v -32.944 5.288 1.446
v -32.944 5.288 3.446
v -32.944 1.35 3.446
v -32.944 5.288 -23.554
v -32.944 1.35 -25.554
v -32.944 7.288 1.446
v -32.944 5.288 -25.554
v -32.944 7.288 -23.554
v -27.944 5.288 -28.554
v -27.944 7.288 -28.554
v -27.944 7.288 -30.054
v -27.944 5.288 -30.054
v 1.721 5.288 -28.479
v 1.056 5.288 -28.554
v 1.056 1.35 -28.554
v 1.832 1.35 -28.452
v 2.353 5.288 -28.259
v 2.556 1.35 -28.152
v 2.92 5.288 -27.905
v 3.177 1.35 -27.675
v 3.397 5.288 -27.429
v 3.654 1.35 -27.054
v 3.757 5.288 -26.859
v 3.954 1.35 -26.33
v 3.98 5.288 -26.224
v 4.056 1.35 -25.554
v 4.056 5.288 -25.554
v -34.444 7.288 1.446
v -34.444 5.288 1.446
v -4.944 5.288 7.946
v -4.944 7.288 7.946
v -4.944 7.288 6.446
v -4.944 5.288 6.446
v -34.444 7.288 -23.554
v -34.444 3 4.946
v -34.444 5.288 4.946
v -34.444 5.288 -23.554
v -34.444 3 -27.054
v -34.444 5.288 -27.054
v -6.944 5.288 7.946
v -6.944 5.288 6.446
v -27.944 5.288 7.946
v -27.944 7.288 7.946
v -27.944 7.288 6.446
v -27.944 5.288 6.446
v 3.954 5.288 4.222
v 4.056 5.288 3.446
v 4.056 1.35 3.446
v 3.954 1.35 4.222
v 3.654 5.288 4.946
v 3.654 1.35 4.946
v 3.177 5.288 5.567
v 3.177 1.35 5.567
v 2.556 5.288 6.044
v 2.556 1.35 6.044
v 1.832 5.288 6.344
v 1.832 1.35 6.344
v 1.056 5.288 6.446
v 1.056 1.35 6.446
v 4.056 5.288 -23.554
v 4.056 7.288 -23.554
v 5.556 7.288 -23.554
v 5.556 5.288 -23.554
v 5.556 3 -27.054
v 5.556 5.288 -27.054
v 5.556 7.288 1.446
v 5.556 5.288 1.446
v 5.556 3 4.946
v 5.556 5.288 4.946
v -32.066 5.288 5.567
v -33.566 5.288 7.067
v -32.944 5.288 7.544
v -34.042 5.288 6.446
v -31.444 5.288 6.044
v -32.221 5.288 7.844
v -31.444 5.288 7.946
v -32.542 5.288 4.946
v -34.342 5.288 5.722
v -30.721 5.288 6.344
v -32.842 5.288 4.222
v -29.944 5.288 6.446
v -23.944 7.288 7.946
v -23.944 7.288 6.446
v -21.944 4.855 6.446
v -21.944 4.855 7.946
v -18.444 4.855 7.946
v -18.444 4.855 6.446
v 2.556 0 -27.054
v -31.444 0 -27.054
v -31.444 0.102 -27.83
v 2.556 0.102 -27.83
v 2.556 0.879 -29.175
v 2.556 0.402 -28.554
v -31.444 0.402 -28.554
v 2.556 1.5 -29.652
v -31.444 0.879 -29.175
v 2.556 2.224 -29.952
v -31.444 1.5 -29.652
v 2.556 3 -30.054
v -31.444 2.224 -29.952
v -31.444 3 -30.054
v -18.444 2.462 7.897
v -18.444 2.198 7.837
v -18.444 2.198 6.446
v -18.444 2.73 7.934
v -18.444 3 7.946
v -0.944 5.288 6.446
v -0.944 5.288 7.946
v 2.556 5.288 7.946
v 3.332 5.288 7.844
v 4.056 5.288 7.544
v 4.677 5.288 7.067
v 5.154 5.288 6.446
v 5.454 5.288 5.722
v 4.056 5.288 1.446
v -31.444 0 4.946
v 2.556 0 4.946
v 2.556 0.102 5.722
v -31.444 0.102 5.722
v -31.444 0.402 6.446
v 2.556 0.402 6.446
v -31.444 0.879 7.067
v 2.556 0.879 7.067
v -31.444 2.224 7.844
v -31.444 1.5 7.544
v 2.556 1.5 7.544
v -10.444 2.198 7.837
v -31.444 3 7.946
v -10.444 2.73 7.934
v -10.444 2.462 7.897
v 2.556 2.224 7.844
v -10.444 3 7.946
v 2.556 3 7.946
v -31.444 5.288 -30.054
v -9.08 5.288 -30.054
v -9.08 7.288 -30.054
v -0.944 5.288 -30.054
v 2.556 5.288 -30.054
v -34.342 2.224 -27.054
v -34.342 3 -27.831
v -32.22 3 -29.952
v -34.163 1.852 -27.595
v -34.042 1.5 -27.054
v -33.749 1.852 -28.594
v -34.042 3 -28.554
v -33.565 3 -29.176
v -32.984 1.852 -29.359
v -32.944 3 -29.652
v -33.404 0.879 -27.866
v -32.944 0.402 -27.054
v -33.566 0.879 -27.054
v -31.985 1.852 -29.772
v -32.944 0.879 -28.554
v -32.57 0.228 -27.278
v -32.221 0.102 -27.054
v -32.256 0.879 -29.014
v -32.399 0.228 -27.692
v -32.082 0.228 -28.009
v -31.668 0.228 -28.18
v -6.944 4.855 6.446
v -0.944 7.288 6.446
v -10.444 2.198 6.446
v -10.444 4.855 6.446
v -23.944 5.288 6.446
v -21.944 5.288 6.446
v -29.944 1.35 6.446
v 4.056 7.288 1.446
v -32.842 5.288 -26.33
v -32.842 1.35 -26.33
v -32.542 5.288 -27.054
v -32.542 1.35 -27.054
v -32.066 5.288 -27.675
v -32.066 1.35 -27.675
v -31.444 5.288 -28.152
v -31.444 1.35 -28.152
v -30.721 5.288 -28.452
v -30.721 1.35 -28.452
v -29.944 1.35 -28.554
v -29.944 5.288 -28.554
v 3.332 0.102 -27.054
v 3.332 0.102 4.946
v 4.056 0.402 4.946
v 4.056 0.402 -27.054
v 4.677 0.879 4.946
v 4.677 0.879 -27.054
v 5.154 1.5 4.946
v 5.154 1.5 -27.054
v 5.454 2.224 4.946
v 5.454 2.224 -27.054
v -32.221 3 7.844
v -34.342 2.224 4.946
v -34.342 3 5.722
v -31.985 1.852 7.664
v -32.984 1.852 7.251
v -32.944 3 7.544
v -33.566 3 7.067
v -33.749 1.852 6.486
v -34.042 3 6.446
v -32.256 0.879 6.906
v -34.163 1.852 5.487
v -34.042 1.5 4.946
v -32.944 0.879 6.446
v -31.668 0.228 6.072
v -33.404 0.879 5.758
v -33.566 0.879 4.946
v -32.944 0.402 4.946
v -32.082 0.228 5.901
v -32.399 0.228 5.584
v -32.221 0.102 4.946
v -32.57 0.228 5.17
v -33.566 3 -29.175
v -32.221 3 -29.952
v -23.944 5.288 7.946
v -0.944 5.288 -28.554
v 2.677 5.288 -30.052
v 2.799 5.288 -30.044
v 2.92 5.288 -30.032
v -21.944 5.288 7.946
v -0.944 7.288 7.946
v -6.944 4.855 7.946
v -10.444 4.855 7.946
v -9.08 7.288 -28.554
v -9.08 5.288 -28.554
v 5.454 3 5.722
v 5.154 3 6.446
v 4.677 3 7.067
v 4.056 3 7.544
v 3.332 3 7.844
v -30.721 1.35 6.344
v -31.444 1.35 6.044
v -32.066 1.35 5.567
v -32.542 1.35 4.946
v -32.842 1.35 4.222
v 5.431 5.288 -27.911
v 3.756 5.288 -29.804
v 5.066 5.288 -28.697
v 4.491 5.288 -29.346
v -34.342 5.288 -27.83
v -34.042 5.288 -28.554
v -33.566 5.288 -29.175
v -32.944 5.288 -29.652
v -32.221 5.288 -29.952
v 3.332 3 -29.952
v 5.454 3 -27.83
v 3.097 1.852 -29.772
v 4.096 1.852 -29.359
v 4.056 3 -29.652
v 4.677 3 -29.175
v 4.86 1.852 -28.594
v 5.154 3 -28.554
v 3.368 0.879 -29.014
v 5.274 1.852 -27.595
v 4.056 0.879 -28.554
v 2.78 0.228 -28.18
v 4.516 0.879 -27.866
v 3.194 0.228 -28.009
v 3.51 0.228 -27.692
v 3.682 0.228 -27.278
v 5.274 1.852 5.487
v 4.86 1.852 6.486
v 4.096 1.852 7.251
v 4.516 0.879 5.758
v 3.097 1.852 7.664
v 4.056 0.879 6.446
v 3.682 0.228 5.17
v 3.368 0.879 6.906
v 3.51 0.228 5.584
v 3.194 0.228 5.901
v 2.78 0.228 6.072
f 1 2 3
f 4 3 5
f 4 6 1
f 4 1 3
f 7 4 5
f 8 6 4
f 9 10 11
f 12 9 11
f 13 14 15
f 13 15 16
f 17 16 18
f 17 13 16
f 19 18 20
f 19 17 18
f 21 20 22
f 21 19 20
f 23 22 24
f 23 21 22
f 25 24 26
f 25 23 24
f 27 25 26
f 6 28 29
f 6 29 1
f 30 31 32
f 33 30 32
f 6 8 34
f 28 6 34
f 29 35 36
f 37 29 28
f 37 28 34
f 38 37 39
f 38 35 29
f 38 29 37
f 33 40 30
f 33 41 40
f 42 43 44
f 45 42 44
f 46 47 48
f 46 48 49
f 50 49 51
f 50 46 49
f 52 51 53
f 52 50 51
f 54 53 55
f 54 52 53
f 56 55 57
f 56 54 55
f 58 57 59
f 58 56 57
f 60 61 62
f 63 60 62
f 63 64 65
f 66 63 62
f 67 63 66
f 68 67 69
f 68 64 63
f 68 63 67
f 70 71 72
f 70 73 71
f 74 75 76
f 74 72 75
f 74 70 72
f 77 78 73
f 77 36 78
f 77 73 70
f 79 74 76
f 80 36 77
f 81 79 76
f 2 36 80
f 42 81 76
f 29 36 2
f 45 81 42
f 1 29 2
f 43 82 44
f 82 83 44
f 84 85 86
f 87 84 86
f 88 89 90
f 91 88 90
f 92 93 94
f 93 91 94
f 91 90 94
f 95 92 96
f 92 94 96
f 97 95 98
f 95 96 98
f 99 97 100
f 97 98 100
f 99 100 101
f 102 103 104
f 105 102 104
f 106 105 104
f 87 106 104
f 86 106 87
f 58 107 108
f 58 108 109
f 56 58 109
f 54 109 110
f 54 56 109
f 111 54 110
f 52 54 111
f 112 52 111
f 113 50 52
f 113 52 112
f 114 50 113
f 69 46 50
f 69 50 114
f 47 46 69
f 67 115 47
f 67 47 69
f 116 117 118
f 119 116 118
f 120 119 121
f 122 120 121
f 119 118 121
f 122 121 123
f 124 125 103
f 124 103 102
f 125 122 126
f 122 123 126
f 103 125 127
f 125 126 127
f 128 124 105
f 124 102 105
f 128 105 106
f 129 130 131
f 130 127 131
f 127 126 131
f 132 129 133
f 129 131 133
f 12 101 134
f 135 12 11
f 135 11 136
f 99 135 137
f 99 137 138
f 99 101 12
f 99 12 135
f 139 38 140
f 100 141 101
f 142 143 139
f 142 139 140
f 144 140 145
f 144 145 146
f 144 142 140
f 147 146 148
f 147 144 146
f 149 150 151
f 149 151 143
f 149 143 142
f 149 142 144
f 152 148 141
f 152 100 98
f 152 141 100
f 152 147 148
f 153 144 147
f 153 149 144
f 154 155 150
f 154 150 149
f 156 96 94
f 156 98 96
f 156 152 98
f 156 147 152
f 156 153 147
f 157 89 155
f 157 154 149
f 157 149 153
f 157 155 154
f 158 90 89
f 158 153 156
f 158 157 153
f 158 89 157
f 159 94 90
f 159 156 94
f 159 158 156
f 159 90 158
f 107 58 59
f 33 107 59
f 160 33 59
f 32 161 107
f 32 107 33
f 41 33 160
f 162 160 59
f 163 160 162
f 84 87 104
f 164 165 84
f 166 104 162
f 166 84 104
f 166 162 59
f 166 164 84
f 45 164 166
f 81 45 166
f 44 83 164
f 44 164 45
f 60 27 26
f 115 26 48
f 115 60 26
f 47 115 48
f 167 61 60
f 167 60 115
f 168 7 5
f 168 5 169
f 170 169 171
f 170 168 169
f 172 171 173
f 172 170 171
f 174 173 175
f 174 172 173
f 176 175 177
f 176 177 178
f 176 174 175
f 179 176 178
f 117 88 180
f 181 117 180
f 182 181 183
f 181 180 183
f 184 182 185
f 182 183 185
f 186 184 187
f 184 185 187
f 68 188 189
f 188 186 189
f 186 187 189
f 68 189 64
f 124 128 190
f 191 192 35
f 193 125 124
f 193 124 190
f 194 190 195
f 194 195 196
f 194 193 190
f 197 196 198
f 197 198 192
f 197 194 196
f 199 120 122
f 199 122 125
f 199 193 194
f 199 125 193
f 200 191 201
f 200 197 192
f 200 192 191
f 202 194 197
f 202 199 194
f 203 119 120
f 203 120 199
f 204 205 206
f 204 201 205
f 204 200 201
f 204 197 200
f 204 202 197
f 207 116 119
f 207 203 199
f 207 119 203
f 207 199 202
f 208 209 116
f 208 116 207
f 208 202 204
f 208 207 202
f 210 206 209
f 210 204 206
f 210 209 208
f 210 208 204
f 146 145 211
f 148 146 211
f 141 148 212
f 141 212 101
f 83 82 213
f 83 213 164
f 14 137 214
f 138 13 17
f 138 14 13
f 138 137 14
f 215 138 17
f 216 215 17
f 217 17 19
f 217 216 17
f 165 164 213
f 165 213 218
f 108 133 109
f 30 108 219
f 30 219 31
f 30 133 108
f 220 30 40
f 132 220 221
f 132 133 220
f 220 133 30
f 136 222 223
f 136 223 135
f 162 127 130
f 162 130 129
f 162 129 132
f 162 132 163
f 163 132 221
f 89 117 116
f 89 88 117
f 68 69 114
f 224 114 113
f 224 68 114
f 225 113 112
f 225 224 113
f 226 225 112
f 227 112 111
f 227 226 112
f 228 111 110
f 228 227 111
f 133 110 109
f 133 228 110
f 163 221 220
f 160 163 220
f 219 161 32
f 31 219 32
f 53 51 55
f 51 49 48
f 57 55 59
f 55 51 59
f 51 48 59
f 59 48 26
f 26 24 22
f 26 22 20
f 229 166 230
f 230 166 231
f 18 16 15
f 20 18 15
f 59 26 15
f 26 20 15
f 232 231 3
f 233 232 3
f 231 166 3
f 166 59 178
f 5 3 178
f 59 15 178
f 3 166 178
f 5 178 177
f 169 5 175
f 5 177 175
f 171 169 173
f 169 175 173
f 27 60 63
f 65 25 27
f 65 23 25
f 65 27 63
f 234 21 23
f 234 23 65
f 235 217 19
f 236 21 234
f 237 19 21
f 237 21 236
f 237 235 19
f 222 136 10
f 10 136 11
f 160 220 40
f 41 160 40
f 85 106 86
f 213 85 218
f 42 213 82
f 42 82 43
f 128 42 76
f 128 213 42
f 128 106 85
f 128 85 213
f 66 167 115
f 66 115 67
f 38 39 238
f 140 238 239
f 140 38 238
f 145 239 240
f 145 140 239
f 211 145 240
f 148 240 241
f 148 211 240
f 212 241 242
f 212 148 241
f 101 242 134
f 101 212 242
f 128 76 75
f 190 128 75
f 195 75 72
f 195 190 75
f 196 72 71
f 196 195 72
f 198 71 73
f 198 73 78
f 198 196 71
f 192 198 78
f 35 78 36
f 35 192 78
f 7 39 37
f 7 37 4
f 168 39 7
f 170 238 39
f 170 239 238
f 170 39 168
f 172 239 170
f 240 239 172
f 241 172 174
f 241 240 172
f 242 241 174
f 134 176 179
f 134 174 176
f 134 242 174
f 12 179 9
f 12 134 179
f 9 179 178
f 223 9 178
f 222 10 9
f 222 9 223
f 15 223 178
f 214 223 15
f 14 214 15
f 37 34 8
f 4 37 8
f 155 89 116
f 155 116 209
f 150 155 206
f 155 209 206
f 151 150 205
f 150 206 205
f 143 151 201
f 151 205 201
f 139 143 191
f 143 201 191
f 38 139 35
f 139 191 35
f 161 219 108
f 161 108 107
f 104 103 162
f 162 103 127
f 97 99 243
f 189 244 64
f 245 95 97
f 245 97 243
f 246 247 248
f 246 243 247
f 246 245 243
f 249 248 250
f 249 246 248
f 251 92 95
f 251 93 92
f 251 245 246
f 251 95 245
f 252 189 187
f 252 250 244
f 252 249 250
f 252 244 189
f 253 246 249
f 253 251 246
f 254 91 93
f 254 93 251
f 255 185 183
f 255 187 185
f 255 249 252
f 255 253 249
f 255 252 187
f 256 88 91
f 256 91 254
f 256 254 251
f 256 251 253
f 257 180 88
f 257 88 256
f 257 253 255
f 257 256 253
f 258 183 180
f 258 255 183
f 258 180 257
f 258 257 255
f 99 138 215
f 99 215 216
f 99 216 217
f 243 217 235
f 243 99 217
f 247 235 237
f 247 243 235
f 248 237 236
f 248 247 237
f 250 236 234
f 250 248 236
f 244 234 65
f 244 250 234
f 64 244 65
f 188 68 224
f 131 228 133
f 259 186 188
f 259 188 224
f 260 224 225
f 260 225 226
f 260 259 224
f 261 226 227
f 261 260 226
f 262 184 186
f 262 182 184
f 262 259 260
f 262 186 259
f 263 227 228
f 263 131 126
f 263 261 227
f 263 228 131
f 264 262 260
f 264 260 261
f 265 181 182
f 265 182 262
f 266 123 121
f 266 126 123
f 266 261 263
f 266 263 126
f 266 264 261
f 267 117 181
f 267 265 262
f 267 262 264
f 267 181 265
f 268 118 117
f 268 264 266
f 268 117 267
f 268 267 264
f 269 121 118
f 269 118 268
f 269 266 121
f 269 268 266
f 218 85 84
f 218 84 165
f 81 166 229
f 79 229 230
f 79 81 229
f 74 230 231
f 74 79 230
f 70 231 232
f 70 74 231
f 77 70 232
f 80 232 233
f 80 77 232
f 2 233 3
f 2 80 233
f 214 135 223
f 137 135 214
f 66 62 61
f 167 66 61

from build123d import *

# Parameters (mm, degrees)
BOSS_EXTRUDE1_DEPTH = 7.288380162
CUT_EXTRUDE3_DEPTH  = 5.938619602
SKETCH5_W           = 8
SKETCH5_H           = 2.8
SKETCH5_W_2         = 15
SKETCH5_H_2         = 1.082982858
CUT_EXTRUDE6_DEPTH  = 4
FILLET2_R           = 3
SKETCH7_W           = 19
SKETCH7_H           = 6.03347221
CUT_EXTRUDE8_DEPTH  = 2
SKETCH8_W           = 14.334368534
SKETCH8_H           = 11.344502268
SKETCH8_W_2         = 12.278418615
SKETCH8_H_2         = 17.135054821
SKETCH8_W_3         = 15.257811301
SKETCH8_H_3         = 9.410205862
SKETCH8_W_4         = 12.235138376
SKETCH8_H_4         = 13.74281341
CUT_EXTRUDE9_DEPTH  = 2
SKETCH9_W           = 12
SKETCH9_H           = 10.54511274
CUT_EXTRUDE10_DEPTH = 2


with BuildPart() as part:
    # Sketch1 → Boss-Extrude1 (new body)
    with BuildSketch(Plane(origin=(0, 0, 0), x_dir=(1, 0, 0), z_dir=(0, 1, 0))):
        with BuildLine():
            Line((-31.444201696, 30.054028384), (2.555798304, 30.054028384))
            ThreePointArc((2.555798304, 30.054028384), (4.677118648, 29.175348727), (5.555798304, 27.054028384))
            Line((5.555798304, 27.054028384), (5.555798304, -4.945971616))
            ThreePointArc((5.555798304, -4.945971616), (4.677118648, -7.06729196), (2.555798304, -7.945971616))
            Line((2.555798304, -7.945971616), (-31.444201696, -7.945971616))
            ThreePointArc((-31.444201696, -7.945971616), (-33.565522039, -7.06729196), (-34.444201696, -4.945971616))
            Line((-34.444201696, -4.945971616), (-34.444201696, 27.054028384))
            ThreePointArc((-34.444201696, 27.054028384), (-33.565522039, 29.175348727), (-31.444201696, 30.054028384))
        make_face()
    extrude(amount=BOSS_EXTRUDE1_DEPTH)

    # Sketch2 → Cut-Extrude3 (cut)
    with BuildSketch(Plane(origin=(0, 7.288380162, 0), x_dir=(1, 0, 0), z_dir=(0, 1, 0))):
        with BuildLine():
            Line((-29.944201696, 28.554028384), (1.055798304, 28.554028384))
            ThreePointArc((1.055798304, 28.554028384), (3.177118648, 27.675348727), (4.055798304, 25.554028384))
            Line((4.055798304, 25.554028384), (4.055798304, -3.445971616))
            ThreePointArc((4.055798304, -3.445971616), (3.177118648, -5.56729196), (1.055798304, -6.445971616))
            Line((1.055798304, -6.445971616), (-29.944201696, -6.445971616))
            ThreePointArc((-29.944201696, -6.445971616), (-32.065522039, -5.56729196), (-32.944201696, -3.445971616))
            Line((-32.944201696, -3.445971616), (-32.944201696, 25.554028384))
            ThreePointArc((-32.944201696, 25.554028384), (-32.065522039, 27.675348727), (-29.944201696, 28.554028384))
        make_face()
    extrude(amount=-CUT_EXTRUDE3_DEPTH, mode=Mode.SUBTRACT)

    # Sketch5 → Cut-Extrude6 (cut)
    with BuildSketch(Plane.XY.offset(7.945971616)):
        with Locations((-14.444201696, 3.597990821)):
            Rectangle(SKETCH5_W, SKETCH5_H)
        with Locations((-14.444201696, 5.396027171)):
            Rectangle(SKETCH5_W_2, SKETCH5_H_2)
    extrude(amount=-CUT_EXTRUDE6_DEPTH, mode=Mode.SUBTRACT)

    # Fillet2
    # the kernel refuses this fillet: 3 mm, written as the material it takes off along each edge
    with BuildSketch(Plane(origin=(2.555798304, 0, 7.945971616), x_dir=(0, 0, -1), z_dir=(-1, 0, 0))) as fillet2_piece_1:
        with BuildLine():
            CenterArc((FILLET2_R, -FILLET2_R), FILLET2_R, 90, 90)
            Line((0, -FILLET2_R), (-FILLET2_R * 0.02, -FILLET2_R))
            Line((-FILLET2_R * 0.02, -FILLET2_R), (-FILLET2_R * 0.02, FILLET2_R * 0.02))
            Line((-FILLET2_R * 0.02, FILLET2_R * 0.02), (FILLET2_R, FILLET2_R * 0.02))
            Line((FILLET2_R, FILLET2_R * 0.02), (FILLET2_R, 0))
        make_face()
    extrude(amount=34, mode=Mode.SUBTRACT)
    with BuildSketch(Plane(origin=(2.555798304, 0, 4.945971616), x_dir=(1, 0, 0), z_dir=(0, 0, -1))) as fillet2_piece_2:
        with BuildLine():
            CenterArc((3 - FILLET2_R, -FILLET2_R), FILLET2_R, 0, 90)
            Line((3, -FILLET2_R), (3 + FILLET2_R * 0.02, -FILLET2_R))
            Line((3 + FILLET2_R * 0.02, -FILLET2_R), (3 + FILLET2_R * 0.02, 0))
            Line((3 + FILLET2_R * 0.02, 0), (3, FILLET2_R * 0.02))
            Line((3, FILLET2_R * 0.02), (3 - FILLET2_R, FILLET2_R * 0.02))
            Line((3 - FILLET2_R, FILLET2_R * 0.02), (3 - FILLET2_R, 0))
        make_face()
    revolve(axis=Axis((2.555798304, 0, 4.945971616), (0, -1, 0)), revolution_arc=90, mode=Mode.SUBTRACT)
    with BuildSketch(Plane(origin=(5.555798304, 0, -27.054028384), x_dir=(-1, 0, 0), z_dir=(0, 0, 1)), Plane(origin=(-34.444201696, 0, 4.945971616), x_dir=(1, 0, 0), z_dir=(0, 0, -1))) as fillet2_piece_3:
        with BuildLine():
            CenterArc((FILLET2_R, -FILLET2_R), FILLET2_R, 90, 90)
            Line((0, -FILLET2_R), (-FILLET2_R * 0.02, -FILLET2_R))
            Line((-FILLET2_R * 0.02, -FILLET2_R), (-FILLET2_R * 0.02, FILLET2_R * 0.02))
            Line((-FILLET2_R * 0.02, FILLET2_R * 0.02), (FILLET2_R, FILLET2_R * 0.02))
            Line((FILLET2_R, FILLET2_R * 0.02), (FILLET2_R, 0))
        make_face()
    extrude(amount=32, mode=Mode.SUBTRACT)
    with BuildSketch(Plane(origin=(2.555798304, 0, -27.054028384), x_dir=(0, 0, -1), z_dir=(-1, 0, 0))) as fillet2_piece_4:
        with BuildLine():
            CenterArc((3 - FILLET2_R, -FILLET2_R), FILLET2_R, 0, 90)
            Line((3 - FILLET2_R, 0), (3 - FILLET2_R, FILLET2_R * 0.02))
            Line((3 - FILLET2_R, FILLET2_R * 0.02), (3, FILLET2_R * 0.02))
            Line((3, FILLET2_R * 0.02), (3 + FILLET2_R * 0.02, 0))
            Line((3 + FILLET2_R * 0.02, 0), (3 + FILLET2_R * 0.02, -FILLET2_R))
            Line((3 + FILLET2_R * 0.02, -FILLET2_R), (3, -FILLET2_R))
        make_face()
    revolve(axis=Axis((2.555798304, 0, -27.054028384), (0, -1, 0)), revolution_arc=90, mode=Mode.SUBTRACT)
    with BuildSketch(Plane(origin=(-31.444201696, 0, -30.054028384), x_dir=(0, 1, 0), z_dir=(1, 0, 0))) as fillet2_piece_5:
        with BuildLine():
            CenterArc((FILLET2_R, FILLET2_R), FILLET2_R, 180, 90)
            Line((0, FILLET2_R), (-FILLET2_R * 0.02, FILLET2_R))
            Line((-FILLET2_R * 0.02, FILLET2_R), (-FILLET2_R * 0.02, -FILLET2_R * 0.02))
            Line((-FILLET2_R * 0.02, -FILLET2_R * 0.02), (FILLET2_R, -FILLET2_R * 0.02))
            Line((FILLET2_R, -FILLET2_R * 0.02), (FILLET2_R, 0))
        make_face()
    extrude(amount=34, mode=Mode.SUBTRACT)
    with BuildSketch(Plane(origin=(-31.444201696, 0, -27.054028384), x_dir=(-1, 0, 0), z_dir=(0, 0, 1))) as fillet2_piece_6:
        with BuildLine():
            CenterArc((3 - FILLET2_R, -FILLET2_R), FILLET2_R, 0, 90)
            Line((3 - FILLET2_R, 0), (3 - FILLET2_R, FILLET2_R * 0.02))
            Line((3 - FILLET2_R, FILLET2_R * 0.02), (3, FILLET2_R * 0.02))
            Line((3, FILLET2_R * 0.02), (3 + FILLET2_R * 0.02, 0))
            Line((3 + FILLET2_R * 0.02, 0), (3 + FILLET2_R * 0.02, -FILLET2_R))
            Line((3 + FILLET2_R * 0.02, -FILLET2_R), (3, -FILLET2_R))
        make_face()
    revolve(axis=Axis((-31.444201696, 0, -27.054028384), (0, -1, 0)), revolution_arc=90, mode=Mode.SUBTRACT)
    with BuildSketch(Plane(origin=(-31.444201696, 0, 4.945971616), x_dir=(0, 0, 1), z_dir=(1, 0, 0))) as fillet2_piece_7:
        with BuildLine():
            CenterArc((3 - FILLET2_R, -FILLET2_R), FILLET2_R, 0, 90)
            Line((3, -FILLET2_R), (3 + FILLET2_R * 0.02, -FILLET2_R))
            Line((3 + FILLET2_R * 0.02, -FILLET2_R), (3 + FILLET2_R * 0.02, 0))
            Line((3 + FILLET2_R * 0.02, 0), (3, FILLET2_R * 0.02))
            Line((3, FILLET2_R * 0.02), (3 - FILLET2_R, FILLET2_R * 0.02))
            Line((3 - FILLET2_R, FILLET2_R * 0.02), (3 - FILLET2_R, 0))
        make_face()
    revolve(axis=Axis((-31.444201696, 0, 4.945971616), (0, -1, 0)), revolution_arc=90, mode=Mode.SUBTRACT)

    # Sketch7 → Cut-Extrude8 (cut)
    with BuildSketch(Plane(origin=(0, 7.288380162, 0), x_dir=(1, 0, 0), z_dir=(0, 1, 0))):
        with Locations((-14.444201696, -7.080404366)):
            Rectangle(SKETCH7_W, SKETCH7_H)
    extrude(amount=-CUT_EXTRUDE8_DEPTH, mode=Mode.SUBTRACT)

    # Sketch8 → Cut-Extrude9 (cut)
    with BuildSketch(Plane(origin=(0, 7.288380162, 0), x_dir=(1, 0, 0), z_dir=(0, 1, 0))):
        with Locations((6.222982571, -7.11822275)):
            Rectangle(SKETCH8_W, SKETCH8_H)
        with Locations((-34.083411004, -10.013499027)):
            Rectangle(SKETCH8_W_2, SKETCH8_H_2)
        with Locations((-35.573107347, 28.259131315)):
            Rectangle(SKETCH8_W_3, SKETCH8_H_3)
        with Locations((5.173367492, 30.425435089)):
            Rectangle(SKETCH8_W_4, SKETCH8_H_4)
    extrude(amount=-CUT_EXTRUDE9_DEPTH, mode=Mode.SUBTRACT)

    # Sketch9 → Cut-Extrude10 (cut)
    with BuildSketch(Plane(origin=(0, 7.288380162, 0), x_dir=(1, 0, 0), z_dir=(0, 1, 0))):
        with Locations((-3.080143155, 28.401822491)):
            Rectangle(SKETCH9_W, SKETCH9_H)
    extrude(amount=-CUT_EXTRUDE10_DEPTH, mode=Mode.SUBTRACT)


solid = part.part
